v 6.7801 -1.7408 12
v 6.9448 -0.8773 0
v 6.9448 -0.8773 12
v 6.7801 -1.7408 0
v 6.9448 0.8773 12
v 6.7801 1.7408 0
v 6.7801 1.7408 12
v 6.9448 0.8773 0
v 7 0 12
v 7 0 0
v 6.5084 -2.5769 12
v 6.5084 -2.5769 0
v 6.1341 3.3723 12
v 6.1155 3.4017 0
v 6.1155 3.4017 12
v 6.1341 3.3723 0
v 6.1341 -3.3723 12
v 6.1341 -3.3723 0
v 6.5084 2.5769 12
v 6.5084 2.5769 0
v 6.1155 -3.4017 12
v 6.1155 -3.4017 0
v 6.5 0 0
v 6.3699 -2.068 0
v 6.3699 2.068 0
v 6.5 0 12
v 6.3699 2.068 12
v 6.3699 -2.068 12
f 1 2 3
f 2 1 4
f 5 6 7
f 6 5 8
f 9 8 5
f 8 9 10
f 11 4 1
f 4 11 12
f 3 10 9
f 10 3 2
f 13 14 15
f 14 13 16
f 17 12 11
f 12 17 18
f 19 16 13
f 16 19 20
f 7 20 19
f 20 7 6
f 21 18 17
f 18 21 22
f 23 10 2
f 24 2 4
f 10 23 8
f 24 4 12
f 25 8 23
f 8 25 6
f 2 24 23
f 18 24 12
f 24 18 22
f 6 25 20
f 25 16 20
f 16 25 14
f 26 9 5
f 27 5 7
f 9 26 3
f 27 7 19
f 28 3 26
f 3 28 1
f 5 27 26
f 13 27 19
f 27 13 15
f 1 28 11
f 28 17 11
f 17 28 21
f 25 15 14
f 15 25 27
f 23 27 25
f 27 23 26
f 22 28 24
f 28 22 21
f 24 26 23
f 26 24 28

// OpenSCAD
$fn = 50;


difference() {
	union() {
		cylinder(h = 12, r = 7.0000000000);
		translate(v = [-13.0000000000, 0, 0]) {
			cylinder(h = 12, r = 7.0000000000);
		}
	}
	union() {
		cylinder(h = 12, r = 3.2500000000);
		cylinder(h = 12, r = 1.8000000000);
		cylinder(h = 12, r = 1.8000000000);
		cylinder(h = 12, r = 1.8000000000);
		translate(v = [-17.5000000000, 0, 0]) {
			hull() {
				translate(v = [-3.7500000000, 0.0000000000, 0]) {
					cylinder(h = 12, r = 10.5000000000);
				}
				translate(v = [3.7500000000, 0.0000000000, 0]) {
					cylinder(h = 12, r = 10.5000000000);
				}
				translate(v = [-3.7500000000, -0.0000000000, 0]) {
					cylinder(h = 12, r = 10.5000000000);
				}
				translate(v = [3.7500000000, -0.0000000000, 0]) {
					cylinder(h = 12, r = 10.5000000000);
				}
			}
		}
		translate(v = [-10.0000000000, 0, 0.0000000000]) {
			cylinder(h = 12, r = 16.5000000000);
		}
	}
}
